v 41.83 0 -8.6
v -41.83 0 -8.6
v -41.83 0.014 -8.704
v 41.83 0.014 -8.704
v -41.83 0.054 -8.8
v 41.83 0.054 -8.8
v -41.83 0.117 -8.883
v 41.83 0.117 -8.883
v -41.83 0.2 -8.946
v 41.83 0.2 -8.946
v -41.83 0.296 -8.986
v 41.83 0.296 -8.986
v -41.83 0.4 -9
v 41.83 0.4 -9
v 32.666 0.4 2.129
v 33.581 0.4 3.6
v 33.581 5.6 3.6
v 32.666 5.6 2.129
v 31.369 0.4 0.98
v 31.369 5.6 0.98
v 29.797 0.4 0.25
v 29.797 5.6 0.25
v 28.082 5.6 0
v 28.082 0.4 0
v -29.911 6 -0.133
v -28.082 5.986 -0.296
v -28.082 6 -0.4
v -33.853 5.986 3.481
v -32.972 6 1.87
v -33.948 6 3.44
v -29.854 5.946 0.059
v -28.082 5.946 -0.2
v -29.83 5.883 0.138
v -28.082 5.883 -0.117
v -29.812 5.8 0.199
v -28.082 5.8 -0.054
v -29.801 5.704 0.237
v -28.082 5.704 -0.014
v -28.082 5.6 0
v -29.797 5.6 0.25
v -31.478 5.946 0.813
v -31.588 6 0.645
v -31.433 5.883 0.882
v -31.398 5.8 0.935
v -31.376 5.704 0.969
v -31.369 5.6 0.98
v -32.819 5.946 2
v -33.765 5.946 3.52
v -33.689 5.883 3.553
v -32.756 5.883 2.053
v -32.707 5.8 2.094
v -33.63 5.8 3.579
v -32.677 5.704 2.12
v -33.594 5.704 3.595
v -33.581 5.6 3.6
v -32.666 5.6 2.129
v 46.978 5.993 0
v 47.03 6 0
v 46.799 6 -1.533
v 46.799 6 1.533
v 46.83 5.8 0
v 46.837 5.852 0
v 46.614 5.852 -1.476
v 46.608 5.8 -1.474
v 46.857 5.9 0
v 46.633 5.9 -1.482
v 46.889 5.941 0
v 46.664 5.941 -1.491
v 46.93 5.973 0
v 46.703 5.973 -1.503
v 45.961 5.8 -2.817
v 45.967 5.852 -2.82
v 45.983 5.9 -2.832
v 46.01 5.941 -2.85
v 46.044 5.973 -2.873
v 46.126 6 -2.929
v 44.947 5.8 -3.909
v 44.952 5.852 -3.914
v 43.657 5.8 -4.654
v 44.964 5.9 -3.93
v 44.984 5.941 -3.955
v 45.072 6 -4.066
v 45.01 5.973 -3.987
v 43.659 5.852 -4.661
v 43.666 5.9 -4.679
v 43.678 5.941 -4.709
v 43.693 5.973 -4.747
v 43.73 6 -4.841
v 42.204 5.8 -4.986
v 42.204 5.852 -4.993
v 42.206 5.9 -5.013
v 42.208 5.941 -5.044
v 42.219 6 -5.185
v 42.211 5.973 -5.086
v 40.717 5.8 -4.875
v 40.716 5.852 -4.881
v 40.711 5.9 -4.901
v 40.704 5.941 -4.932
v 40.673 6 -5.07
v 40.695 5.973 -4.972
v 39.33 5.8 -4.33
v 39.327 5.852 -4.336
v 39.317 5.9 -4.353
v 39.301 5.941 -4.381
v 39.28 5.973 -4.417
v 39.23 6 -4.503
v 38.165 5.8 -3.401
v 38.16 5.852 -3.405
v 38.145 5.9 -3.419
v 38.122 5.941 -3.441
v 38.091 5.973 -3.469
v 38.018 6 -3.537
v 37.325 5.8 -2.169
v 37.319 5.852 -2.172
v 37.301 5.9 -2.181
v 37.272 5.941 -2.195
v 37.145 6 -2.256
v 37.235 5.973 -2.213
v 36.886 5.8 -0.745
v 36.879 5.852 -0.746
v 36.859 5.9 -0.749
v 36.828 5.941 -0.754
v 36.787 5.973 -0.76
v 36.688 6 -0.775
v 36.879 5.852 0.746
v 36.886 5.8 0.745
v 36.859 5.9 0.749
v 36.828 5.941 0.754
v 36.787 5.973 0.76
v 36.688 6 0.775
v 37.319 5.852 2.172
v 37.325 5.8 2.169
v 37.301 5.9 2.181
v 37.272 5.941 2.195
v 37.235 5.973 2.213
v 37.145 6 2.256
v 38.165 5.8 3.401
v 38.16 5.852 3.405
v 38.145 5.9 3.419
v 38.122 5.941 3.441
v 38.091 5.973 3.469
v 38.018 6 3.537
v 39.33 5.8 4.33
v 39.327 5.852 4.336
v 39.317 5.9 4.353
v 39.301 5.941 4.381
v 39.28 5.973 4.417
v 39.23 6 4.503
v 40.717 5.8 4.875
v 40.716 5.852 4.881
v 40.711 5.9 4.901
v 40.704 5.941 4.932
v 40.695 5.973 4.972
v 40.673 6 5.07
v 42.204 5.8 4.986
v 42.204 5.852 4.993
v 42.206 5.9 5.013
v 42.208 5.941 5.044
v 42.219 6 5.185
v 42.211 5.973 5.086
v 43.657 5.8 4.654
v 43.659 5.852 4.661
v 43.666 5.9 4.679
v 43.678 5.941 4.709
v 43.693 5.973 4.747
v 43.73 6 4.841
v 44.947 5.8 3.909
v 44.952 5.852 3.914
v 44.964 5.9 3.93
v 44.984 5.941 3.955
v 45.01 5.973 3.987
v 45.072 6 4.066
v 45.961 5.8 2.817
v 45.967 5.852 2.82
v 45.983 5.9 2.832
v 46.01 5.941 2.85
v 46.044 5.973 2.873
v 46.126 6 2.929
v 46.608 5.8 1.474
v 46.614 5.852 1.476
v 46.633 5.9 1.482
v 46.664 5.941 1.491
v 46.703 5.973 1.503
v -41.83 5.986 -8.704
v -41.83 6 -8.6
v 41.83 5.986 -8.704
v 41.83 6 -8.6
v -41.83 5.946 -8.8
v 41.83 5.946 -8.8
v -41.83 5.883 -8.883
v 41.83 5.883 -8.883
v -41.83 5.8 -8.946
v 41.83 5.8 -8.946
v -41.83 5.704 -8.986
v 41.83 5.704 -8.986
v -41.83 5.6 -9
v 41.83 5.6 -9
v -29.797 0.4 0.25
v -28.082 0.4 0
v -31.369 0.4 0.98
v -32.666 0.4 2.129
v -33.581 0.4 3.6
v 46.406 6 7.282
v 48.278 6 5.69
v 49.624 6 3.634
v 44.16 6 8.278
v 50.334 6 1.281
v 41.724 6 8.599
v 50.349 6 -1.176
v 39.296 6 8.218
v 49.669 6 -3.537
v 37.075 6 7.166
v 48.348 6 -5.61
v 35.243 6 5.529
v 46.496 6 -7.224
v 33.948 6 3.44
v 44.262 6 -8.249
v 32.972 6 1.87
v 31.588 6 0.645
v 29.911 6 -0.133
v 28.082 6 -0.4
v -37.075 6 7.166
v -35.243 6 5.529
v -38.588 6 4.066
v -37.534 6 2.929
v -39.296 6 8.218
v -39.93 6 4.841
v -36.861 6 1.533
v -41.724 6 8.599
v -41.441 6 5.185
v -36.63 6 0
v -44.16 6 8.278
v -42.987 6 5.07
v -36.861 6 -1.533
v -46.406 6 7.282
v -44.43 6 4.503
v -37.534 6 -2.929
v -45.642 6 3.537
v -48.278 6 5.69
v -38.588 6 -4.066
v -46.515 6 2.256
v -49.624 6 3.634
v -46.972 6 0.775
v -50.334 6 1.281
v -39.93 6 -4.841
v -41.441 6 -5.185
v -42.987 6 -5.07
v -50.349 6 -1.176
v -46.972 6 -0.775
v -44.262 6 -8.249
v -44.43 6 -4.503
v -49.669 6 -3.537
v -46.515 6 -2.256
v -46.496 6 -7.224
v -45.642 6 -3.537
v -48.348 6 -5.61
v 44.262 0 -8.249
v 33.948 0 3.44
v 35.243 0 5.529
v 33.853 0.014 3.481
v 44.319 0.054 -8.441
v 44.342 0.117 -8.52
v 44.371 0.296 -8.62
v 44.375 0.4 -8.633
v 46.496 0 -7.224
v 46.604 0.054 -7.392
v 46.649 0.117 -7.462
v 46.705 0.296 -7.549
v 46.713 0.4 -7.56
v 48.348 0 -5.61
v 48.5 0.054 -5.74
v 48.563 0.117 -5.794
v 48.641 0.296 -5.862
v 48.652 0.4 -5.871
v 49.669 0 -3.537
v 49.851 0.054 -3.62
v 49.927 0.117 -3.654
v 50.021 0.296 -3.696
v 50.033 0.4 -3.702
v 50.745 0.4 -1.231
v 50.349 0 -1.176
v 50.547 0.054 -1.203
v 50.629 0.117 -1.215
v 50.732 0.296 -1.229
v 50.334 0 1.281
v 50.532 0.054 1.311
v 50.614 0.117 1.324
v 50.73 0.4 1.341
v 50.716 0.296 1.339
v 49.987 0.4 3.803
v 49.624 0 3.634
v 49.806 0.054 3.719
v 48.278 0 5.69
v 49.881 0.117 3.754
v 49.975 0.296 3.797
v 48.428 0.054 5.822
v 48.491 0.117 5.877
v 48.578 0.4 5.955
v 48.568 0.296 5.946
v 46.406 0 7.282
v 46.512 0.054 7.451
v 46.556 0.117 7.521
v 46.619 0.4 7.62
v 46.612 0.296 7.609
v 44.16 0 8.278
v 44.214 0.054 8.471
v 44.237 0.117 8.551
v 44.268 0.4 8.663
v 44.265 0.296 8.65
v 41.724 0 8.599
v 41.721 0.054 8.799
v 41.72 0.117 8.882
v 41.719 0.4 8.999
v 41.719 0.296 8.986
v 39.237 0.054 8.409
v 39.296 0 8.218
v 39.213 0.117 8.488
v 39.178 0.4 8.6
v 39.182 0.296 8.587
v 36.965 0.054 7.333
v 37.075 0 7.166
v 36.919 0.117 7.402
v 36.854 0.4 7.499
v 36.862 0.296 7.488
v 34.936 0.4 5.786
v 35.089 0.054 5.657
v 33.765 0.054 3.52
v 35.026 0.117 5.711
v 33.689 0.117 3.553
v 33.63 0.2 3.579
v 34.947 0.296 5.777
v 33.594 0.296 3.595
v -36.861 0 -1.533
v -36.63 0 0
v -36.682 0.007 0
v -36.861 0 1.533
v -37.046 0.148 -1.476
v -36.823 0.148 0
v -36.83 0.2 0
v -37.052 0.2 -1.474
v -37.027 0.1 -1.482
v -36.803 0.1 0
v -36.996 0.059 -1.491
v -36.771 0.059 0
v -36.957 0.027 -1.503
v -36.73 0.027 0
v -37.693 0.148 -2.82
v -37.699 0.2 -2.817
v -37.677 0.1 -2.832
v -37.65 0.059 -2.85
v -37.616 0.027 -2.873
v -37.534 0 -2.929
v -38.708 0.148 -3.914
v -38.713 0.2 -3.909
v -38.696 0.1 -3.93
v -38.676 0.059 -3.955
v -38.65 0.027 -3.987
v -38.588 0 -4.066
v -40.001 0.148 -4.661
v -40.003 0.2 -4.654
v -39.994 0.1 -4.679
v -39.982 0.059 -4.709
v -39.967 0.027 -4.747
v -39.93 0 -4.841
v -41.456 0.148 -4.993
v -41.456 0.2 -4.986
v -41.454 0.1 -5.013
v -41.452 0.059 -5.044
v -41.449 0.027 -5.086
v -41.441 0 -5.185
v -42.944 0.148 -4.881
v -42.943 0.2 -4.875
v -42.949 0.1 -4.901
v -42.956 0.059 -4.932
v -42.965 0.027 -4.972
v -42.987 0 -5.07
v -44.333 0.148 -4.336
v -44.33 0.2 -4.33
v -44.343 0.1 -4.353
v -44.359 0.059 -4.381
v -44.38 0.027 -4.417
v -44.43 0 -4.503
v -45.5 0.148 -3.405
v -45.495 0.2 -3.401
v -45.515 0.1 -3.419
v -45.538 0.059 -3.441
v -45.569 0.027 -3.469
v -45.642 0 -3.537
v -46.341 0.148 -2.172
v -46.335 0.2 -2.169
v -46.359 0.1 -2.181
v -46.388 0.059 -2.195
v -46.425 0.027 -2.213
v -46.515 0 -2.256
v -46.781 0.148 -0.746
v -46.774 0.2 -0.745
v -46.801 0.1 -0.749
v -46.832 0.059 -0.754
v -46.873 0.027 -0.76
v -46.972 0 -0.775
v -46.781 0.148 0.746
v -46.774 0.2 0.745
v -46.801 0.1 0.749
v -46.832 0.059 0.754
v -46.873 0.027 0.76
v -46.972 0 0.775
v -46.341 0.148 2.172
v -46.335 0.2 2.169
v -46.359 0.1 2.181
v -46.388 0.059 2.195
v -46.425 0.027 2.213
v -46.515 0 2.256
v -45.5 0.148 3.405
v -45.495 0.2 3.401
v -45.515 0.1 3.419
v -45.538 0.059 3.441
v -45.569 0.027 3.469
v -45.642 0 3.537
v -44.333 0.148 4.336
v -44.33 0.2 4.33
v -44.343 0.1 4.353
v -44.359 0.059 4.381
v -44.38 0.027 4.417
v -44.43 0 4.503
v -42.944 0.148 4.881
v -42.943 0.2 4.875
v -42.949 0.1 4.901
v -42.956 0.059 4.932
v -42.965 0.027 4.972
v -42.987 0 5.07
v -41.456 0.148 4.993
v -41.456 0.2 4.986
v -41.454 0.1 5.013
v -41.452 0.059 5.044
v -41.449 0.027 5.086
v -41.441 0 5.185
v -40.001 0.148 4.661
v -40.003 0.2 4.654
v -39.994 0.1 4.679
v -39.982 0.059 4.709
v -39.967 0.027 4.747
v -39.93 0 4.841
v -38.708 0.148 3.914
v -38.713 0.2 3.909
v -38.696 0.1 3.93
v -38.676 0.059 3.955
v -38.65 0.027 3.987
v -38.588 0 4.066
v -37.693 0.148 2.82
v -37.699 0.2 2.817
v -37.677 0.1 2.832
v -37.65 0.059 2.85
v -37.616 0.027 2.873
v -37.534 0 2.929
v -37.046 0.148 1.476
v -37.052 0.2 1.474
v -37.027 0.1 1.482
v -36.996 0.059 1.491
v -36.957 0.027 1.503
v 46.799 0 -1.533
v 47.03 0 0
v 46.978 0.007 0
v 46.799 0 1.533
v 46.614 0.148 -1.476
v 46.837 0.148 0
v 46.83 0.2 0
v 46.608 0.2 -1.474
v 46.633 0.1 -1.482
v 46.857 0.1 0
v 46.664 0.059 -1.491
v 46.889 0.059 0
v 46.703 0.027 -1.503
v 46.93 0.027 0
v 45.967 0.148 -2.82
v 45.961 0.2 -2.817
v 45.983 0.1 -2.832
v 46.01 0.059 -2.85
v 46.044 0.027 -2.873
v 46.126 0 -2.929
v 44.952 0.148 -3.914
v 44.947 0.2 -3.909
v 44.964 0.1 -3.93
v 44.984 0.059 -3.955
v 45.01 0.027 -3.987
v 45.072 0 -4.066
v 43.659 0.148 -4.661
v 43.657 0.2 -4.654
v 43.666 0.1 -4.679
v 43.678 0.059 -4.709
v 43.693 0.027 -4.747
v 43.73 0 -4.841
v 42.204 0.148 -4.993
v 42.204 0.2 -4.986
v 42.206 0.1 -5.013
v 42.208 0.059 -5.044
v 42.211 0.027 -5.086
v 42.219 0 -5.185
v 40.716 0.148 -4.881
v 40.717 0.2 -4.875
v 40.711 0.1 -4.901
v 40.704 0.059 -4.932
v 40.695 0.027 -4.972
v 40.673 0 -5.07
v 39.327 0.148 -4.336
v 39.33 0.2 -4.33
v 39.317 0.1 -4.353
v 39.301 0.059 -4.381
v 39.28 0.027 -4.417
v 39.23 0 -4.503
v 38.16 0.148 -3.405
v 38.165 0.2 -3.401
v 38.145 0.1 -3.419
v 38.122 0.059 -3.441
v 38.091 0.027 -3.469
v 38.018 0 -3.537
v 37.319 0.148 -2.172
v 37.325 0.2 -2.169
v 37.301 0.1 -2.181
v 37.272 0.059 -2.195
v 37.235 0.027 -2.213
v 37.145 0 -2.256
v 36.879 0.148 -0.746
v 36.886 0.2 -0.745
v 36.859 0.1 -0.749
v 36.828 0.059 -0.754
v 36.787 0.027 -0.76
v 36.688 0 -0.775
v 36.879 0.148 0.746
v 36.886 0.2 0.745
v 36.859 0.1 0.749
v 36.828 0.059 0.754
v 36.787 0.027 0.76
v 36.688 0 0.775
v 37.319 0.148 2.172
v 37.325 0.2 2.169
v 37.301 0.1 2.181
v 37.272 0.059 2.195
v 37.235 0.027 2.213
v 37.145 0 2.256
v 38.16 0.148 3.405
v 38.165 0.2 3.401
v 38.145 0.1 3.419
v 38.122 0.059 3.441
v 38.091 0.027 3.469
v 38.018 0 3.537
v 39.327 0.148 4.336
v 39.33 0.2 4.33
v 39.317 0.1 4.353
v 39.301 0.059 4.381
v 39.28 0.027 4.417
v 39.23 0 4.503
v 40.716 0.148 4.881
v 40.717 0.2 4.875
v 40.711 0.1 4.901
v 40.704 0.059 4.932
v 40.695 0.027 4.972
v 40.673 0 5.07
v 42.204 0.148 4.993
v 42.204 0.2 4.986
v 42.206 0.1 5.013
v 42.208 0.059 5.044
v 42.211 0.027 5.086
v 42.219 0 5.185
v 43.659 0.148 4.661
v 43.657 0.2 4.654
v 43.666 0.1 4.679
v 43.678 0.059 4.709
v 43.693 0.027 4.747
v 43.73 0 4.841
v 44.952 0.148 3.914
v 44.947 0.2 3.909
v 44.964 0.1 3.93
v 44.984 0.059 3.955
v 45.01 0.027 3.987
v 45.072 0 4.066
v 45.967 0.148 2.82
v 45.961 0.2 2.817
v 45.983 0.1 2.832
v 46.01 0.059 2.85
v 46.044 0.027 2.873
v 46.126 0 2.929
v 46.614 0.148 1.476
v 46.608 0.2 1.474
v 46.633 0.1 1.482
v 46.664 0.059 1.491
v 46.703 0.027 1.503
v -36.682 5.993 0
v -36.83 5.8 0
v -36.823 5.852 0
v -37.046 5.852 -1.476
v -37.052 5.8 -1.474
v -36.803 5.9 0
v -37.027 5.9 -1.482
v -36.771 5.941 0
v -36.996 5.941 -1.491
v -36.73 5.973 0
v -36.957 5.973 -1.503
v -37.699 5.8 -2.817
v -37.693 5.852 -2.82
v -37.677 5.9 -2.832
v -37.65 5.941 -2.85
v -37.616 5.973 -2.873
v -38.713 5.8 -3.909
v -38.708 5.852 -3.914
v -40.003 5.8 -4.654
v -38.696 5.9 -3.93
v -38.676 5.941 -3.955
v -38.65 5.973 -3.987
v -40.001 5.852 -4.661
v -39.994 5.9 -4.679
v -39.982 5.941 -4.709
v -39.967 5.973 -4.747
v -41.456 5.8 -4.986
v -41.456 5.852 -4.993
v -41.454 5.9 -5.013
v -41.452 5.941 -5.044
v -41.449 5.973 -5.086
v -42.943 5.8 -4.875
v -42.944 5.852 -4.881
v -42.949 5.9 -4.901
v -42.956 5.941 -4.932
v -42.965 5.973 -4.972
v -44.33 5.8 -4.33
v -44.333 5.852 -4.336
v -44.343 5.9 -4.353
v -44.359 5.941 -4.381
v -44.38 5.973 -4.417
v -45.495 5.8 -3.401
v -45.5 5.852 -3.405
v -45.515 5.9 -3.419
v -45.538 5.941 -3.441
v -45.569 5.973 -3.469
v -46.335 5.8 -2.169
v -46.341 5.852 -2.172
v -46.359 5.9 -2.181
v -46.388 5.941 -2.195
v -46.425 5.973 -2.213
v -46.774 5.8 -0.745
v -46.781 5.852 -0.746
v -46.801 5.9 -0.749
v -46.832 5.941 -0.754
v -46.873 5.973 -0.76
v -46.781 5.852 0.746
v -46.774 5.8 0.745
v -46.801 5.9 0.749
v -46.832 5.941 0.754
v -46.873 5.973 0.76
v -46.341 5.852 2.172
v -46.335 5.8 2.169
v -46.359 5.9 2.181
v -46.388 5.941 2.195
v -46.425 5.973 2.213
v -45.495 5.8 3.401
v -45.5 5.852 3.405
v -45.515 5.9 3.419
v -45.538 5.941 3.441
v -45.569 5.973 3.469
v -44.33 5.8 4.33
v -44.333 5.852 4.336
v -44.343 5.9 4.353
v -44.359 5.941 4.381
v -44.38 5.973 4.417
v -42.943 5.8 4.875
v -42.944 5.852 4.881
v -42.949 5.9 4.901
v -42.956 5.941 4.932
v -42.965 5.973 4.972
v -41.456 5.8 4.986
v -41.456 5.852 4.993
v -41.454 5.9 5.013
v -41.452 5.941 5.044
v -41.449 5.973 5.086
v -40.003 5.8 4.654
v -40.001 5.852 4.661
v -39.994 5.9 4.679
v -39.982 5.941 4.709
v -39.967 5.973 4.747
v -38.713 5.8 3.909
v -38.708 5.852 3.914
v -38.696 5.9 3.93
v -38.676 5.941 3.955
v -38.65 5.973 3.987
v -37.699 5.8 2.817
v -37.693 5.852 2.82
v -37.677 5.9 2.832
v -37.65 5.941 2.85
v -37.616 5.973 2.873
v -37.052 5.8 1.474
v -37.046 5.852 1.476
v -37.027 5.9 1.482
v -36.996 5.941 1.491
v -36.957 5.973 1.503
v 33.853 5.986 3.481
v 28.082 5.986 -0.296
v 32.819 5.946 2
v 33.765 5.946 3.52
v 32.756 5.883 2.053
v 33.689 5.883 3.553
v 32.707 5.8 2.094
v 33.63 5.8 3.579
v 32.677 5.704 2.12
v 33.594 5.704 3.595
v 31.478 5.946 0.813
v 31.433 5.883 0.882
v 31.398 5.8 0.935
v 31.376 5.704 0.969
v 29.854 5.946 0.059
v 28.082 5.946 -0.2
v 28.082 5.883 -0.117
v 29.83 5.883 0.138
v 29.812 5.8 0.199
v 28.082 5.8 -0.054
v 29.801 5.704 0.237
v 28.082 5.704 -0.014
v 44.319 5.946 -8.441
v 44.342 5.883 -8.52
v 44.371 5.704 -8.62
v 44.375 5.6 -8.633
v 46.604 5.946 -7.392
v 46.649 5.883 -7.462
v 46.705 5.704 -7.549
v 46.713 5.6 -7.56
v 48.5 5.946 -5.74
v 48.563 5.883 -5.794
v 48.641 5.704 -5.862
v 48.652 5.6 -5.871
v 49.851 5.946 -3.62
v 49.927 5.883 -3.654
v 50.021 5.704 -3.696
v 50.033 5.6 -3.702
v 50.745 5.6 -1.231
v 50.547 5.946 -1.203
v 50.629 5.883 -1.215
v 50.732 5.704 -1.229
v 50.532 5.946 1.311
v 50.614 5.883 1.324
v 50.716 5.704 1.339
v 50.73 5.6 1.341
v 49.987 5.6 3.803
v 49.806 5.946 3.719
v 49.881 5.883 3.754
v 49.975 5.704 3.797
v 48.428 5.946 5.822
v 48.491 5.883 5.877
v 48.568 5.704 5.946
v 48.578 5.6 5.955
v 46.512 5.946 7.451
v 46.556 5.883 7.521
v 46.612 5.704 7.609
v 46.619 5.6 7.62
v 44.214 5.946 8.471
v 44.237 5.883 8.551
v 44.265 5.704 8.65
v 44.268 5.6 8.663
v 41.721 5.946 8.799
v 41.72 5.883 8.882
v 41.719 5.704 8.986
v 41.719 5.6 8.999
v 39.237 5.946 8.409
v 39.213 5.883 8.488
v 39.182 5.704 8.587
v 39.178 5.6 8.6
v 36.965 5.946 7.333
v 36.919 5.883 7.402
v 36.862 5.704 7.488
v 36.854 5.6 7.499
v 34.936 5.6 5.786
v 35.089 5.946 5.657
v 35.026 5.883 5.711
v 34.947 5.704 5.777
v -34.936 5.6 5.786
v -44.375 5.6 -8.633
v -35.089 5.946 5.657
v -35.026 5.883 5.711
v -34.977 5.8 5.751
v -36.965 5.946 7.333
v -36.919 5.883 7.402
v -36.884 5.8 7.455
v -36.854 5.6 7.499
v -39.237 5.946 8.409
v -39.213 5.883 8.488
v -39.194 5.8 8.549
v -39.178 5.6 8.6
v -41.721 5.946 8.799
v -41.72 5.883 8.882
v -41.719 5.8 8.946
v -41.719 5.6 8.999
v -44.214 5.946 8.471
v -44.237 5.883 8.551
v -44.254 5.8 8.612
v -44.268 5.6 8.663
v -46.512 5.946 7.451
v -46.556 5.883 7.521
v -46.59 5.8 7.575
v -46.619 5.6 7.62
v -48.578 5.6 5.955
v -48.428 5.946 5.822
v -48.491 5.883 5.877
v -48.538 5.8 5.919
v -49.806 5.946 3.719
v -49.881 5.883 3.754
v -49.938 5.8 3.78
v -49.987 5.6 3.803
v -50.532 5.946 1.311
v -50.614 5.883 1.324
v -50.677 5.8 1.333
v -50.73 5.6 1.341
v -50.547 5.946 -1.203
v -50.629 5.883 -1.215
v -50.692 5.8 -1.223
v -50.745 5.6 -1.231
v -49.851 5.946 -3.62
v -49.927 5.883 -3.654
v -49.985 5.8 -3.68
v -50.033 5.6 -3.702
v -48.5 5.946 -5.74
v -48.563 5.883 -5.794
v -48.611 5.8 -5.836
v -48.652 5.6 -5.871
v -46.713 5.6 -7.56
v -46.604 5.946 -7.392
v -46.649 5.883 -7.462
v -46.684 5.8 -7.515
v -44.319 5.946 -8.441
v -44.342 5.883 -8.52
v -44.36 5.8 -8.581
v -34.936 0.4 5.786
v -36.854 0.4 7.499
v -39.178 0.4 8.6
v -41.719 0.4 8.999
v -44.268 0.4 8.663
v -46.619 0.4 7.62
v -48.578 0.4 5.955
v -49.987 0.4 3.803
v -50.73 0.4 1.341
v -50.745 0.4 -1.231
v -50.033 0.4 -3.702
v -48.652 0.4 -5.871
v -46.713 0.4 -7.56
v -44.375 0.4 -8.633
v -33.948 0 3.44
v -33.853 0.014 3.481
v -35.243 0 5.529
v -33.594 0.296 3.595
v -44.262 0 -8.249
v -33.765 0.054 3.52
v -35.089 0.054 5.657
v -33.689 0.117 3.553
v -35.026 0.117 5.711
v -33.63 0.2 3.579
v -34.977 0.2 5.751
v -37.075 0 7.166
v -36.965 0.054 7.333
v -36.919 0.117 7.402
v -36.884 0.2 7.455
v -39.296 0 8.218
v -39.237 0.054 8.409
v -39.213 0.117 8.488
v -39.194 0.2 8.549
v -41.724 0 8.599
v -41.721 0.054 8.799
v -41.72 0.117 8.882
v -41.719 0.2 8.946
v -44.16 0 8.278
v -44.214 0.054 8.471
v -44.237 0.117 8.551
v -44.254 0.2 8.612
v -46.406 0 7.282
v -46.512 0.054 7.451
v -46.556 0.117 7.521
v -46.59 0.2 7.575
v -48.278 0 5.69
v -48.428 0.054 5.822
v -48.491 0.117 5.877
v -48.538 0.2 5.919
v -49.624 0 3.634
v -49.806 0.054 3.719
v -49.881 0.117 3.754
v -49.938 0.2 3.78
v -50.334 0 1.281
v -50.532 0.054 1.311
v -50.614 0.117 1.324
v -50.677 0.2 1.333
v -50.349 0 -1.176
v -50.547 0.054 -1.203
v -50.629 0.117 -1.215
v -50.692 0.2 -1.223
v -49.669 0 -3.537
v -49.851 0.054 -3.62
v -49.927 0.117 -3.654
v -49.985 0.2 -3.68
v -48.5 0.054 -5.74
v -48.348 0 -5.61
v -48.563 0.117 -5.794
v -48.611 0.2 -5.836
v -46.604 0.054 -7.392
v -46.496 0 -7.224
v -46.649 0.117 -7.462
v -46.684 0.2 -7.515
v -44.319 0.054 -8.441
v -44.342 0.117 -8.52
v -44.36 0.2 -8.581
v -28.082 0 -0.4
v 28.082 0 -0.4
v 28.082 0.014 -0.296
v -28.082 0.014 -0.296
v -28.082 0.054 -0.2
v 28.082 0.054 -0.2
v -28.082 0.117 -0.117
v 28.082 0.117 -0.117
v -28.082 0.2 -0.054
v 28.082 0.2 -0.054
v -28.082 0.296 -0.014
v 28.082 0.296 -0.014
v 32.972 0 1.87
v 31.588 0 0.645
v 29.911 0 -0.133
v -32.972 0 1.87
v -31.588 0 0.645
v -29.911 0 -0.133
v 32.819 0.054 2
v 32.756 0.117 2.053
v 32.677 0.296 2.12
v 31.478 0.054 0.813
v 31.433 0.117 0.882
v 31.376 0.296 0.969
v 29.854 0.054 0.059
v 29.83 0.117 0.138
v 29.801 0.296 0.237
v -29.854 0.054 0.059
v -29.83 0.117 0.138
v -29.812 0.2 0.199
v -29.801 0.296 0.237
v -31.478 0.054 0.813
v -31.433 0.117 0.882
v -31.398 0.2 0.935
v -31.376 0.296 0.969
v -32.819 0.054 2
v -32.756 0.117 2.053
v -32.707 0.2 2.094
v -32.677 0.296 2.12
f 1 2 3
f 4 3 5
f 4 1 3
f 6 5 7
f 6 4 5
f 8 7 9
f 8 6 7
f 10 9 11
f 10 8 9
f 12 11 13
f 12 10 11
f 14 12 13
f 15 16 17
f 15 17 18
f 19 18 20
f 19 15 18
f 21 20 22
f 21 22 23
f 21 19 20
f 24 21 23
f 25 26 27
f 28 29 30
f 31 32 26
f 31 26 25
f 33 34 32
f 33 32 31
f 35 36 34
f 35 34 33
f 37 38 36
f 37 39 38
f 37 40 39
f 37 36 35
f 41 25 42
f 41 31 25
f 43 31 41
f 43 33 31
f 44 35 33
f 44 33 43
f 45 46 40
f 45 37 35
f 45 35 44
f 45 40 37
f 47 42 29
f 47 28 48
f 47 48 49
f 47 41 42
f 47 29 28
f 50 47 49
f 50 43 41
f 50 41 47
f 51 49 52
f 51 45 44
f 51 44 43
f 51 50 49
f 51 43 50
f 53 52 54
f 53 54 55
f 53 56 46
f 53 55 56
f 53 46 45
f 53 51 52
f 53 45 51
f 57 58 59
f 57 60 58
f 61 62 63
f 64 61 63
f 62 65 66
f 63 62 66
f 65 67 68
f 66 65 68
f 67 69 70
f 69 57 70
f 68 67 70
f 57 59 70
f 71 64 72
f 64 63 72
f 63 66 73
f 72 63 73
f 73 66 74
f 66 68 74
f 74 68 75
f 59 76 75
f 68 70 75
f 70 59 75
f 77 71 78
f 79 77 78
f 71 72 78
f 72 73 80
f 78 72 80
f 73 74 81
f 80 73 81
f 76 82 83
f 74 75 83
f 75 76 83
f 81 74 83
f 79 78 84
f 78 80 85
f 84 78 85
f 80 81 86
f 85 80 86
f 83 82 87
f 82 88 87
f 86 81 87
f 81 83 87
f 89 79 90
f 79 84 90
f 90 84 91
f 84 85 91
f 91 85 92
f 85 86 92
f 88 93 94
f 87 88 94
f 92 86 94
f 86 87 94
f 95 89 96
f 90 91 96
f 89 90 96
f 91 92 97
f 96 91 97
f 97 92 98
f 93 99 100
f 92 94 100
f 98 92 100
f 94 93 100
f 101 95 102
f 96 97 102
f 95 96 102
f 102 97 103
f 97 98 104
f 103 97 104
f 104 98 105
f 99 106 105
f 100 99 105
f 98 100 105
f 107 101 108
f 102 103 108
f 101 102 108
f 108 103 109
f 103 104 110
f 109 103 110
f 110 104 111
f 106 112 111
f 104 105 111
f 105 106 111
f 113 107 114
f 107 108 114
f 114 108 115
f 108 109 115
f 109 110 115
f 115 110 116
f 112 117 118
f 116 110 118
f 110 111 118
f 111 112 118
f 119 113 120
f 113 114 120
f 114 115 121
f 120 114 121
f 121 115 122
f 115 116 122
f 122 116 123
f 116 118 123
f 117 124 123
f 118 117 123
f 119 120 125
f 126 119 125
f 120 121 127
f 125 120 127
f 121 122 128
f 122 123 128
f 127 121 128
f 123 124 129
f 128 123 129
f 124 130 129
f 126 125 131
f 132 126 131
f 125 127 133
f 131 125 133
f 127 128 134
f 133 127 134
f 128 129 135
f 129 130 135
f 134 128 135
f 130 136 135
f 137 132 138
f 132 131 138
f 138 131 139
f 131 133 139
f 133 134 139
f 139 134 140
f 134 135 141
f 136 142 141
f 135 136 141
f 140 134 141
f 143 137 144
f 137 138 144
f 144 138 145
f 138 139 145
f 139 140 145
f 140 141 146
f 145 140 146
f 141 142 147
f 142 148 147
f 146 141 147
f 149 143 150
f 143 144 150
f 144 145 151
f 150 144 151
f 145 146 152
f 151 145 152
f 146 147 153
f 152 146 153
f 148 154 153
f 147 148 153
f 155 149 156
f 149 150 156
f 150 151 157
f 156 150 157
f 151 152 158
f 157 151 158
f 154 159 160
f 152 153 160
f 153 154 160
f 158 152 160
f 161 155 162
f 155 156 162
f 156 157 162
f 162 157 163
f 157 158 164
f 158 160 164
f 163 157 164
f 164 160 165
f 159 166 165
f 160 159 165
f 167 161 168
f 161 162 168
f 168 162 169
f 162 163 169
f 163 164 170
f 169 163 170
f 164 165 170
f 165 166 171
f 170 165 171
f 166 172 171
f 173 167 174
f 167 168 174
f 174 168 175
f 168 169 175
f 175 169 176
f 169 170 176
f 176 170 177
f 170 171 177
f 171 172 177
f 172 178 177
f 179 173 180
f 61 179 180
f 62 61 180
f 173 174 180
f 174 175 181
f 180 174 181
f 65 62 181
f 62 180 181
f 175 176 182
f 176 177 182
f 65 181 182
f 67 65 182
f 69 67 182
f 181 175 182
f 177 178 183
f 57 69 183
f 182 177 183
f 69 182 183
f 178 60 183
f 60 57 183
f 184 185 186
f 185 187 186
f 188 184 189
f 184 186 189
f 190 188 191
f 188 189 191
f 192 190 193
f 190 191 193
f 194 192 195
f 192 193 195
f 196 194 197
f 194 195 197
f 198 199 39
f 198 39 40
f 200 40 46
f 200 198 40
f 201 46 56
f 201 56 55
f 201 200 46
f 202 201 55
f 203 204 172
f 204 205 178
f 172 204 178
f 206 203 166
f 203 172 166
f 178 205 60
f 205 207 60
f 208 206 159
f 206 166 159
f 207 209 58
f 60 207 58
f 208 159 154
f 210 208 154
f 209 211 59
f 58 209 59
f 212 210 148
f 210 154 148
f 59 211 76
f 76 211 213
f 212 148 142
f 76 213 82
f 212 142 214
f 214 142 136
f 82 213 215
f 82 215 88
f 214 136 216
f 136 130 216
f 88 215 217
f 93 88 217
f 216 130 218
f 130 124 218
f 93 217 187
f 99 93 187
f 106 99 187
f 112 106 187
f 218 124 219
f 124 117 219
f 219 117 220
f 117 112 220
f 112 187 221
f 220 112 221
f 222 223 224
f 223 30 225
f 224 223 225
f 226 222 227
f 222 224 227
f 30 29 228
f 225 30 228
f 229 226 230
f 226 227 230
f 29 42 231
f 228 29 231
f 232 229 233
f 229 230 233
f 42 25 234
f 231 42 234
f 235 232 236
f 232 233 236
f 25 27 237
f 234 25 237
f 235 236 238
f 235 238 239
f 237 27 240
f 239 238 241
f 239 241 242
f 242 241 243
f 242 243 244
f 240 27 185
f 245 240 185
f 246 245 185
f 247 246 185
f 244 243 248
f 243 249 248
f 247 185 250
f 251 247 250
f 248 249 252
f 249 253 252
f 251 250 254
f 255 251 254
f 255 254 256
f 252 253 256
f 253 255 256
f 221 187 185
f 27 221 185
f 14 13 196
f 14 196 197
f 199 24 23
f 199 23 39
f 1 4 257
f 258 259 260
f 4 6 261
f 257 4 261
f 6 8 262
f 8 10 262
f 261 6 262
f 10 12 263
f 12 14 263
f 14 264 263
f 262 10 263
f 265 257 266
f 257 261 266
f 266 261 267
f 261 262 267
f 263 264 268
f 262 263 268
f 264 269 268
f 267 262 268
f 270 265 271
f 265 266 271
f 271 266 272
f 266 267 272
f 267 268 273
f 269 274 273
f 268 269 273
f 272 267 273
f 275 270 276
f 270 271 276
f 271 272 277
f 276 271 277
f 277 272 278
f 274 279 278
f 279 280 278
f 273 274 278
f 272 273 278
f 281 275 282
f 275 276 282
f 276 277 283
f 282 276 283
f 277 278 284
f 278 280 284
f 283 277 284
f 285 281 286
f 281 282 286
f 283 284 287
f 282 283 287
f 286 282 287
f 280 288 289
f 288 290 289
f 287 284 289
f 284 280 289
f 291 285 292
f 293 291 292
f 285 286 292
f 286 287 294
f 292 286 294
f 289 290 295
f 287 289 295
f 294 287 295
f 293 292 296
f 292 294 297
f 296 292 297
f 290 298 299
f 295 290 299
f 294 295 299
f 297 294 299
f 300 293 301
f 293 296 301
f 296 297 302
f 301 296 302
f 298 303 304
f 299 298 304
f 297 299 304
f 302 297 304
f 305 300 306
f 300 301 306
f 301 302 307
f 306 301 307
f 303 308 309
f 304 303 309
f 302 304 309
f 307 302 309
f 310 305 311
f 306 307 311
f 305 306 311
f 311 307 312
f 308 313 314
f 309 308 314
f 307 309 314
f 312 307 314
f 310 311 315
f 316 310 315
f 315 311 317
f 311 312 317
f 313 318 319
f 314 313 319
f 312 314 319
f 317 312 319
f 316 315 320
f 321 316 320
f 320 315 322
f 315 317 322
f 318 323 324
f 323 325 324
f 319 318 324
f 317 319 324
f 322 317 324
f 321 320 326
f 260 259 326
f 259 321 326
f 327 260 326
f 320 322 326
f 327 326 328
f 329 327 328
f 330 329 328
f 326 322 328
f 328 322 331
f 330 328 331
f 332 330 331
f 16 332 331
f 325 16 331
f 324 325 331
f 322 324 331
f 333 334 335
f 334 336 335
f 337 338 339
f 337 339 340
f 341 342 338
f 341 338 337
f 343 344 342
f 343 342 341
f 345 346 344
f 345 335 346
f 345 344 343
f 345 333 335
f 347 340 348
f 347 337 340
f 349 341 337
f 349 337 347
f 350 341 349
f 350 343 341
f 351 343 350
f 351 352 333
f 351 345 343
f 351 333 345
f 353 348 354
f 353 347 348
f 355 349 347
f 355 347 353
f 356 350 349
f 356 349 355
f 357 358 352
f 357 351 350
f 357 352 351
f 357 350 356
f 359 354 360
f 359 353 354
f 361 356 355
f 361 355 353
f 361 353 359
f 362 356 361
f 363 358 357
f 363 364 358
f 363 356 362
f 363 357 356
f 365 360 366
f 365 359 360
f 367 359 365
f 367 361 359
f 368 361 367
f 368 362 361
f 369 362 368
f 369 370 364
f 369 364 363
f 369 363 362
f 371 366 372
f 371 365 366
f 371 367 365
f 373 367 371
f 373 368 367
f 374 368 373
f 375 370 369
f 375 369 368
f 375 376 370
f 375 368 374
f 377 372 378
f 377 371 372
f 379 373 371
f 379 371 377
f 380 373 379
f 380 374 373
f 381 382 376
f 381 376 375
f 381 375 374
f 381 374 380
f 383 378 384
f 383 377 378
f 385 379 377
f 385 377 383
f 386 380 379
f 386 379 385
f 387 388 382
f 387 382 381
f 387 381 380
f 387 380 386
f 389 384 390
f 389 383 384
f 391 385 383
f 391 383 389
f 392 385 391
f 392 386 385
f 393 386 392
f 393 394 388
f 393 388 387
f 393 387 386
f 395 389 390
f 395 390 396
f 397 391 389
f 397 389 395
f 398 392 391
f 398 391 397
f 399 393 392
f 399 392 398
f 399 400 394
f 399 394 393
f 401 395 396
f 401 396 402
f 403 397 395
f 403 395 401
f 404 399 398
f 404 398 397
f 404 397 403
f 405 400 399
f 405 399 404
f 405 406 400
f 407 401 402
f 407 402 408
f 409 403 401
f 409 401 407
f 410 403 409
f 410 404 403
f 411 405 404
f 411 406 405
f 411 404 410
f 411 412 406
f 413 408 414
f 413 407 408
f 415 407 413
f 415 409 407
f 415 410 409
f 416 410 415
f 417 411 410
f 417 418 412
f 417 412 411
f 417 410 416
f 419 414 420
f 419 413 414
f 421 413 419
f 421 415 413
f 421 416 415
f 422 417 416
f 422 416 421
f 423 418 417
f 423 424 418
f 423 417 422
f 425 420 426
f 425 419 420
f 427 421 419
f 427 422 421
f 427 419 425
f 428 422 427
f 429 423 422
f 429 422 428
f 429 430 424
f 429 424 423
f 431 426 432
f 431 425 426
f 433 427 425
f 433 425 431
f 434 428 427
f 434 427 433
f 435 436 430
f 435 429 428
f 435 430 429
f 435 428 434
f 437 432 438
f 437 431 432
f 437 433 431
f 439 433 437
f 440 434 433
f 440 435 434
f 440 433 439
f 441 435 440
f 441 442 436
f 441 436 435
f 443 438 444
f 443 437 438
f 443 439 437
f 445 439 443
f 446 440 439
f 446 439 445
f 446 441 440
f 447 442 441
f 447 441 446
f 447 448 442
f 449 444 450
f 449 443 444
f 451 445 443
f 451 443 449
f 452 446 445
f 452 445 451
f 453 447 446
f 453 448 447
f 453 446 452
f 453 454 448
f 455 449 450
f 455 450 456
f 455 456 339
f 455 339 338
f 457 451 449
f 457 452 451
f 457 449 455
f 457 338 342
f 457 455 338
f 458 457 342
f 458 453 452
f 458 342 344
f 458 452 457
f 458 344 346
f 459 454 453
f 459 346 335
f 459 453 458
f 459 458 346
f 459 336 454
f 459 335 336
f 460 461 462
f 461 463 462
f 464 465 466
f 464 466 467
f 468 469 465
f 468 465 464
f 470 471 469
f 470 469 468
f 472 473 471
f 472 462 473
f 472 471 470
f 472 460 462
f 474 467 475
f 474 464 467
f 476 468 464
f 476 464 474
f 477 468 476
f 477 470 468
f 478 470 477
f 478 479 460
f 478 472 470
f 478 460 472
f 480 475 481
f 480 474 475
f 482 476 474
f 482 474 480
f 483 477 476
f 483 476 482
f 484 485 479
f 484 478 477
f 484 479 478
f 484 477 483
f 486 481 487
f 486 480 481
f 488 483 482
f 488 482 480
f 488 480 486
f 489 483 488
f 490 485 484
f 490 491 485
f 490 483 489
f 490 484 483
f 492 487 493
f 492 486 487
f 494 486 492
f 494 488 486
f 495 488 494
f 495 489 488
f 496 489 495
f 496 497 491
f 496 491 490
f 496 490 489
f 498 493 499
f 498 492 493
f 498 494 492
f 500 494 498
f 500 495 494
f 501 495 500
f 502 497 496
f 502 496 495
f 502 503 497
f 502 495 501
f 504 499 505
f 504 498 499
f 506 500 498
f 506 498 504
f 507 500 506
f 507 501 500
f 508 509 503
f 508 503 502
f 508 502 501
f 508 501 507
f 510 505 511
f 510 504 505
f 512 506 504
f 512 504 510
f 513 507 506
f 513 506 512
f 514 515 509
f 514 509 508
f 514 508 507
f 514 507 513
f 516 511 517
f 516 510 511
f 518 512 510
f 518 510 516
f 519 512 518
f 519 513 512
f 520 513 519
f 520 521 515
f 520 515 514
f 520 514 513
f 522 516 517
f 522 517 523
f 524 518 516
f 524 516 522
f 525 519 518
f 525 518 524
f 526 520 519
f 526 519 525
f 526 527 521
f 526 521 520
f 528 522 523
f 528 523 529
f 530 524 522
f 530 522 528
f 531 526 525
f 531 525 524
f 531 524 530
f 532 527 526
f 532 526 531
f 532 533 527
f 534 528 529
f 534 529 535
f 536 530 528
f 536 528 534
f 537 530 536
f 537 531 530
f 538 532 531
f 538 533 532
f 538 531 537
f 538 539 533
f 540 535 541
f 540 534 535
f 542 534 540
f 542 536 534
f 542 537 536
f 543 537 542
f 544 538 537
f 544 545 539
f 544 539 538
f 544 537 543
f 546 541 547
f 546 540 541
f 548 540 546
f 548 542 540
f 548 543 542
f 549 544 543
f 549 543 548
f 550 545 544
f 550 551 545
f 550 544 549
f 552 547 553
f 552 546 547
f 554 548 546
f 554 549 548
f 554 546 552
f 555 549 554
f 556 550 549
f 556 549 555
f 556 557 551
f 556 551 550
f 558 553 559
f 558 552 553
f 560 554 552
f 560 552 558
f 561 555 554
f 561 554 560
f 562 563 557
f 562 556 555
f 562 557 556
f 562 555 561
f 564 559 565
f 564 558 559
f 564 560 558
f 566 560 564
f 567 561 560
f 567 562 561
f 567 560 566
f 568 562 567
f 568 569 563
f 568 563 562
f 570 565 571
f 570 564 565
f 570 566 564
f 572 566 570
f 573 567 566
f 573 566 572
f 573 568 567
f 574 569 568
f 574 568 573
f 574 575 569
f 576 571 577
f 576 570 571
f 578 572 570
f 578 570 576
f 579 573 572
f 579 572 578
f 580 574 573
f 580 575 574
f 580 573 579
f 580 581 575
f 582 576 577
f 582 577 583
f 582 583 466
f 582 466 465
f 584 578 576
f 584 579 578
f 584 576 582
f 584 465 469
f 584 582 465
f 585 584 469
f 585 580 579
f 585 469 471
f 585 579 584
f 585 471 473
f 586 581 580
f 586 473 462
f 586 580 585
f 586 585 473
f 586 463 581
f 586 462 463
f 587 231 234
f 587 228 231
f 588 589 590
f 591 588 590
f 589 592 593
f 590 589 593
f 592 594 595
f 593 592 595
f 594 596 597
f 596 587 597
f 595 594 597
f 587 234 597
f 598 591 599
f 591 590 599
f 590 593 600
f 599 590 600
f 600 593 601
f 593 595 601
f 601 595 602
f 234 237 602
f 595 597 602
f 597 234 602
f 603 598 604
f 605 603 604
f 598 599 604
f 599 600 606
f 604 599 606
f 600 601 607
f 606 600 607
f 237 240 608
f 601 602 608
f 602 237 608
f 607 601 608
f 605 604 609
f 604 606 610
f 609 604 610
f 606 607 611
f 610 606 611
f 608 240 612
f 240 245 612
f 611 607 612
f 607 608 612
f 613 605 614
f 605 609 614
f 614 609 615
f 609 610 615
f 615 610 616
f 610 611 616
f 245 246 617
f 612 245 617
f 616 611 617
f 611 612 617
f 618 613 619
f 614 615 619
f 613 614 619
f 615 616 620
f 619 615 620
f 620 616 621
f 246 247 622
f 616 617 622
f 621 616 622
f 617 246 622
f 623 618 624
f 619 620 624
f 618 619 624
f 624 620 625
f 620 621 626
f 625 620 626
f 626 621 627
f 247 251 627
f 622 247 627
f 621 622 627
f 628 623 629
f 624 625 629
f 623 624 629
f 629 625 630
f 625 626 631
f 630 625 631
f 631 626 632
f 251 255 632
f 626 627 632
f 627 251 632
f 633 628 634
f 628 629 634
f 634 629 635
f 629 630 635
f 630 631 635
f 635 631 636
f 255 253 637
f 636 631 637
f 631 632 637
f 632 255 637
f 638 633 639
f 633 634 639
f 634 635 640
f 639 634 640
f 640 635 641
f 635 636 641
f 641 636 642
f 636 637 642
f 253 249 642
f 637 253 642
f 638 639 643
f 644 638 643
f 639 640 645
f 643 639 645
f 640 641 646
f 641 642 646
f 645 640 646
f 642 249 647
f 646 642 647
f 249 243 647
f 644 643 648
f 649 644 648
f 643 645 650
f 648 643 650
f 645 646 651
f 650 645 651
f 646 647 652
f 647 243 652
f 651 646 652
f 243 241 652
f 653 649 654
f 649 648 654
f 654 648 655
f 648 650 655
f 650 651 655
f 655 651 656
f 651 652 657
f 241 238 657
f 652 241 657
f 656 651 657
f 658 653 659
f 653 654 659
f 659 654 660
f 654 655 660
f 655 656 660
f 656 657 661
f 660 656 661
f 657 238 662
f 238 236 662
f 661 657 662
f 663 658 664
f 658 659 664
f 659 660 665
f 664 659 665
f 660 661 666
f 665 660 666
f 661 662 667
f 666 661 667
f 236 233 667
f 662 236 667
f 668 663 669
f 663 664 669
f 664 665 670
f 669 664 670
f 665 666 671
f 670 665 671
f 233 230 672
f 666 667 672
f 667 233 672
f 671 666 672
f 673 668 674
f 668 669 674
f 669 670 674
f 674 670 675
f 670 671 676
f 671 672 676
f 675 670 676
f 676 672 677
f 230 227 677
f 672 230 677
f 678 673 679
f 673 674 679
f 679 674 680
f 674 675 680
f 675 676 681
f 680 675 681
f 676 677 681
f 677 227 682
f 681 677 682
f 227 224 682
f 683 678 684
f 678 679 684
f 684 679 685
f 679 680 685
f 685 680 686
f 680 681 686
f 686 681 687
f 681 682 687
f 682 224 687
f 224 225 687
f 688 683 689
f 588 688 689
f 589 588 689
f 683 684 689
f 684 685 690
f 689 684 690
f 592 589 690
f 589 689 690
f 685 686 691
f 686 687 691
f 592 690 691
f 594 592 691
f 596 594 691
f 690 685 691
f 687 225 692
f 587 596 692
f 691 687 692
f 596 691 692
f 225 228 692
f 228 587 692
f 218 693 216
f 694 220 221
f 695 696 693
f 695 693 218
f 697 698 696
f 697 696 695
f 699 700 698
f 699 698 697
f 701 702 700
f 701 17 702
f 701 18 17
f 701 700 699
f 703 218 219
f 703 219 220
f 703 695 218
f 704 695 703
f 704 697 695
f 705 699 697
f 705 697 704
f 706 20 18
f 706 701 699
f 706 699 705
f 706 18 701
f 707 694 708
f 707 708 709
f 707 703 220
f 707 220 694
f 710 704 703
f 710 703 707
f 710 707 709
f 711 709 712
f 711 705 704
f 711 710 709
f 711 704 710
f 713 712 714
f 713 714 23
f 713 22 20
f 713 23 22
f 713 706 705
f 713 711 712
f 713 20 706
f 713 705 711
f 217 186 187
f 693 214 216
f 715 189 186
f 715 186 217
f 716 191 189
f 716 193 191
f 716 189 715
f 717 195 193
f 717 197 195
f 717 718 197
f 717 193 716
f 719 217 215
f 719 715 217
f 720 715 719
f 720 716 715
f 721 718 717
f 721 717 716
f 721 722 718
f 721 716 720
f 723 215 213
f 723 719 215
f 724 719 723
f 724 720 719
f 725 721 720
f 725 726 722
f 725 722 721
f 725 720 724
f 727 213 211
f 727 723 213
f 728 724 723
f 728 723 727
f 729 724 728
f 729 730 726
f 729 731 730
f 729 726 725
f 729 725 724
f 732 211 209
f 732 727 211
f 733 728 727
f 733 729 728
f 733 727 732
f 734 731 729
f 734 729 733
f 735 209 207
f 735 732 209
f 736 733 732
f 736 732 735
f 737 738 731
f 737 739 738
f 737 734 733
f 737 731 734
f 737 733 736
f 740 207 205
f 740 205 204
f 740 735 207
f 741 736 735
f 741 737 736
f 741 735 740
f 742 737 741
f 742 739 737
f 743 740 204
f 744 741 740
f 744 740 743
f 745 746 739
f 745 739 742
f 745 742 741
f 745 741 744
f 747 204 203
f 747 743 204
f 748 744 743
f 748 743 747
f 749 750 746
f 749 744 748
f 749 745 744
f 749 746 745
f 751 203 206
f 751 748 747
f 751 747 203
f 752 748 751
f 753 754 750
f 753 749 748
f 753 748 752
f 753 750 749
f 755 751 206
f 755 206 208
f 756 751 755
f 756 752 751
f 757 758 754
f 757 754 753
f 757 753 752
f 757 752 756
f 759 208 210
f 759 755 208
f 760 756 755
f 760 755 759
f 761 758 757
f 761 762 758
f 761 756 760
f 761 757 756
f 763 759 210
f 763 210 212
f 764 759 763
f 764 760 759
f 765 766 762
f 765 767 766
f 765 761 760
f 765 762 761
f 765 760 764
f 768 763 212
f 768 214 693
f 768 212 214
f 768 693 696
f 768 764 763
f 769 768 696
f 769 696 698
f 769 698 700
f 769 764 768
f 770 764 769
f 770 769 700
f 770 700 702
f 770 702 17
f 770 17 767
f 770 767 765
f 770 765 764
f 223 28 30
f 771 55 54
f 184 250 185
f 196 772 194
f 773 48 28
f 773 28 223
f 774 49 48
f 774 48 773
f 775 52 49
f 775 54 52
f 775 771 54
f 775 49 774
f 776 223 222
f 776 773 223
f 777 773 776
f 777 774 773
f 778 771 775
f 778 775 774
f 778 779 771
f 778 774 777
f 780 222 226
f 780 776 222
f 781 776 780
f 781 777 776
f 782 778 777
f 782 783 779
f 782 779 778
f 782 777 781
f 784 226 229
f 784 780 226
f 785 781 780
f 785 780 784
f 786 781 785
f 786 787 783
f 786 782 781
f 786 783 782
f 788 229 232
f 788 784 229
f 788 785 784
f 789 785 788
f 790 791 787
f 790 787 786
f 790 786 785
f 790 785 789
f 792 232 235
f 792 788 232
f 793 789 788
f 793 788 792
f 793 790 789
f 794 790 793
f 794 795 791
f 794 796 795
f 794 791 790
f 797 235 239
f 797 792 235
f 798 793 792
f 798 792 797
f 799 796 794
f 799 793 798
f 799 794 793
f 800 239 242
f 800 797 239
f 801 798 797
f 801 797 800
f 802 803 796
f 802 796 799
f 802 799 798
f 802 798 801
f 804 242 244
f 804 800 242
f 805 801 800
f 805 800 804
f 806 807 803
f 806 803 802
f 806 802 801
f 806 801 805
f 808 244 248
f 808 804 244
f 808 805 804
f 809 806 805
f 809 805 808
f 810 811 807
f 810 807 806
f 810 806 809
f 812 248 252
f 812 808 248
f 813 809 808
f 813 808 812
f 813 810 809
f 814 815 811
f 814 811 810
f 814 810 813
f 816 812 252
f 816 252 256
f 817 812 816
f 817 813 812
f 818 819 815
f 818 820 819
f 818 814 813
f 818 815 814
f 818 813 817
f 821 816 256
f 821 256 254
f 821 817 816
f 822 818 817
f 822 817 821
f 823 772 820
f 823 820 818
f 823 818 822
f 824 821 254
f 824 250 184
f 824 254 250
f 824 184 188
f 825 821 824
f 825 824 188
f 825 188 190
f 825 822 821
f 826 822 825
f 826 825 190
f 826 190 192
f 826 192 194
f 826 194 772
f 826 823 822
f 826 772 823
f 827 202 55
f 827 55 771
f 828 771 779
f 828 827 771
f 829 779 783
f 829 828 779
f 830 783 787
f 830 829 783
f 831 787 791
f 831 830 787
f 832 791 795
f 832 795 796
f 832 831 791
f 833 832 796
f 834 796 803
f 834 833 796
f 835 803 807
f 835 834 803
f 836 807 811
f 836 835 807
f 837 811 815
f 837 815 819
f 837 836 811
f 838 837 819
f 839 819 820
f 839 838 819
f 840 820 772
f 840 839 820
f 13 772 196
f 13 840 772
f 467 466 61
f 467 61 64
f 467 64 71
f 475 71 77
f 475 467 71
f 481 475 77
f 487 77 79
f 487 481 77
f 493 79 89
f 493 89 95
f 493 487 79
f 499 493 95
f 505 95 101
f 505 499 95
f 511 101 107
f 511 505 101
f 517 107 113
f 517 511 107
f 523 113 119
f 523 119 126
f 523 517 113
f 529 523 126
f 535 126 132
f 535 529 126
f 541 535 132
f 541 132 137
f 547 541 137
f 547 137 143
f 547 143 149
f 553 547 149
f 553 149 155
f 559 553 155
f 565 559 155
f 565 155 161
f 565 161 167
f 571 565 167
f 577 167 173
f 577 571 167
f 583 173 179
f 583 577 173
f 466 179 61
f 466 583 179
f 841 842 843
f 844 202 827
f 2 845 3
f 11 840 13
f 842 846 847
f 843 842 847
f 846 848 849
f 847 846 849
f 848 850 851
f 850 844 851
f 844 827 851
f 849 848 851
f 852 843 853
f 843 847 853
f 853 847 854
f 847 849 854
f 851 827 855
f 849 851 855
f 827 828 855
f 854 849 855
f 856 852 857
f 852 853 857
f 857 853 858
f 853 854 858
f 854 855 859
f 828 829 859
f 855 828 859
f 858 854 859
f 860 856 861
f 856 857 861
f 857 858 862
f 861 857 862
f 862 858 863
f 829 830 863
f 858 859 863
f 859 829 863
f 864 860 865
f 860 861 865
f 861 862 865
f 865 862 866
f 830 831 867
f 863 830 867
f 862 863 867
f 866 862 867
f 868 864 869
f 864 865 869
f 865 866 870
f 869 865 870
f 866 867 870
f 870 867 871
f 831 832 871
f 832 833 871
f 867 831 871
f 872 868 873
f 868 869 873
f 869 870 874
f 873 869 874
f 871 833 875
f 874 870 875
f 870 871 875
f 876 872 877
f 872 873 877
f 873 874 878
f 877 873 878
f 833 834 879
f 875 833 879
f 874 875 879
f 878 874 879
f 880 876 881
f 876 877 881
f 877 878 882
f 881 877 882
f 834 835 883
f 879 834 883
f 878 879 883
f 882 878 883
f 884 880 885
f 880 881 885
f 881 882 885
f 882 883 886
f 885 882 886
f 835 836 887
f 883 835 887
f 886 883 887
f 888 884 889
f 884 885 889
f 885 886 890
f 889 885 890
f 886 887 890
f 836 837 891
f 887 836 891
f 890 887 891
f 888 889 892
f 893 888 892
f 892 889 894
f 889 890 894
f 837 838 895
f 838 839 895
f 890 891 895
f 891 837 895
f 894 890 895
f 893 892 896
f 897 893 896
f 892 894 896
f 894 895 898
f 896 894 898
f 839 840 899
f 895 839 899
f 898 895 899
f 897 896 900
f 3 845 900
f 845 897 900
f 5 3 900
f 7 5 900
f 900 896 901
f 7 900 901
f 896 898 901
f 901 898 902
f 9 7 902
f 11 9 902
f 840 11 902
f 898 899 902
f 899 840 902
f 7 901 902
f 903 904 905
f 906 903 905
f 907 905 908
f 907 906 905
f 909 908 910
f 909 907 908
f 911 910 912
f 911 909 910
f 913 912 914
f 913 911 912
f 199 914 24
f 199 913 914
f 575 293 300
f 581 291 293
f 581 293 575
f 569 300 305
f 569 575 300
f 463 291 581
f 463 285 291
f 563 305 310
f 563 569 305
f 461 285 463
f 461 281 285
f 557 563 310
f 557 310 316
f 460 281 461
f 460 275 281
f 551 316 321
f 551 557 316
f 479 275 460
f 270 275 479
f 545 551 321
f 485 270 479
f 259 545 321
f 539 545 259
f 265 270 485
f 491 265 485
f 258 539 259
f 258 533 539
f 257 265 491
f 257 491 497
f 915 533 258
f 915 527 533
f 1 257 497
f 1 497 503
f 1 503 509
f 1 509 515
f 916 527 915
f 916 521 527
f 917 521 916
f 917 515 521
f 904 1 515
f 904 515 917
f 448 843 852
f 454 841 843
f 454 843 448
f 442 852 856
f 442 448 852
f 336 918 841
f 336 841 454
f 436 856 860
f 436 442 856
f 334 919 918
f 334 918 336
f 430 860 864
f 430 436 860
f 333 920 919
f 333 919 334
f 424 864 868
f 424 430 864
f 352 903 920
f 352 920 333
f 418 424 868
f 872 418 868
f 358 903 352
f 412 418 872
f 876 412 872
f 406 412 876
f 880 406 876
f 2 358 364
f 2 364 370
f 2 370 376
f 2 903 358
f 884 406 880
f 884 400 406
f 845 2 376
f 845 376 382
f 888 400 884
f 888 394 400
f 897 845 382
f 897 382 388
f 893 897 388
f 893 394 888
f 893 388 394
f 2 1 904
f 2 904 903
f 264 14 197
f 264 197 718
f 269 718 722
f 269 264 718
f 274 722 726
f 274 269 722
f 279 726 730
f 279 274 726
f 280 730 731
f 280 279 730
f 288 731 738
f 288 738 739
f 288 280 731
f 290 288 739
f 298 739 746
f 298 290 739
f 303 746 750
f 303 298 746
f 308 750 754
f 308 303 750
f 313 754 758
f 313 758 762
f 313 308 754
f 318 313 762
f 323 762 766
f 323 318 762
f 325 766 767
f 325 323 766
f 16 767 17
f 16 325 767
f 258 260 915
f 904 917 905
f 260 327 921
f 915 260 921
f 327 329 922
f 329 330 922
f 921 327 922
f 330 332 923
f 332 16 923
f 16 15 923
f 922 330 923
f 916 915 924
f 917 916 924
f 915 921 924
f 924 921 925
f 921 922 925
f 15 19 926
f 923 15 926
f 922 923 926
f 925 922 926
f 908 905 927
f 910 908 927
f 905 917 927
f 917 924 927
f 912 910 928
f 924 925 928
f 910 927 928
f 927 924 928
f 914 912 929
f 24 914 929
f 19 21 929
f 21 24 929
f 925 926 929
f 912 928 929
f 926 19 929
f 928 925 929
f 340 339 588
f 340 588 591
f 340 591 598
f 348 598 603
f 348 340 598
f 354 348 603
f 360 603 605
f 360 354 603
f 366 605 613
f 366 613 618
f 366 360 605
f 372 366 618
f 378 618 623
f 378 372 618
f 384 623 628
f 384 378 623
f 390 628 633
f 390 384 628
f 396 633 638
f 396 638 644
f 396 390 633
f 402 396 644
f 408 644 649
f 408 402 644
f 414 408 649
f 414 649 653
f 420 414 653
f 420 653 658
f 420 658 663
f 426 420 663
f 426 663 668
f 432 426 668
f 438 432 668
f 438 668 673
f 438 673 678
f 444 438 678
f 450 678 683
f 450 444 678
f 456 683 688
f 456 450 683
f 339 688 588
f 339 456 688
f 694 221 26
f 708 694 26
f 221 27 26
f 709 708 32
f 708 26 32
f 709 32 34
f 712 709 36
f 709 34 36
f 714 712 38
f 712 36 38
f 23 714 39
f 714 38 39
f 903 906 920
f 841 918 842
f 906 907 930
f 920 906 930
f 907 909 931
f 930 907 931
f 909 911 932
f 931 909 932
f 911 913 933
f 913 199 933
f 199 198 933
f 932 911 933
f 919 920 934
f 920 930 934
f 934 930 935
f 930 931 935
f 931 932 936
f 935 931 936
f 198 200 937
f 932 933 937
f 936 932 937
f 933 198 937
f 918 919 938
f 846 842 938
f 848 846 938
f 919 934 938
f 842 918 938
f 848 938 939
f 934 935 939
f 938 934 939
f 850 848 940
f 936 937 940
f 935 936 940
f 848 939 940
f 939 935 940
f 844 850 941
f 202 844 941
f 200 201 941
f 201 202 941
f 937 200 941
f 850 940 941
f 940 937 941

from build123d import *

# Parameters (mm, degrees)
SKETCH_1_R      = 5
EXTRUDE_1_DEPTH = 6
FILLET_1_R      = 0.2
FILLET_2_R      = 0.4


with BuildPart() as part:
    # 草图1 → 凸台-拉伸1 (new body)
    with BuildSketch(Plane(origin=(0, 0, 0), x_dir=(1, 0, 0), z_dir=(0, 1, 0))):
        with BuildLine():
            Line((-41.83, 9), (41.83, 9))
            ThreePointArc((41.83, 9), (49.359940239, -4.929503018), (33.581363749, -3.6))
            ThreePointArc((33.581363749, -3.6), (31.36860826, -0.980039841), (28.082272915, 0))
            Line((28.082272915, 0), (-28.082272915, 0))
            ThreePointArc((-28.082272915, 0), (-31.36860826, -0.980039841), (-33.581363749, -3.6))
            ThreePointArc((-33.581363749, -3.6), (-49.359940239, -4.929503018), (-41.83, 9))
        make_face()
        with Locations((-41.83, 0)):
            Circle(SKETCH_1_R, mode=Mode.SUBTRACT)
        with Locations((41.83, 0)):
            Circle(SKETCH_1_R, mode=Mode.SUBTRACT)
    extrude(amount=EXTRUDE_1_DEPTH)

    # 圆角1
    fillet_1_edges = [part.edges().sort_by_distance(p)[0] for p in [
        (-46.83, 0, 0),
        (-46.83, 6, 0),
        (36.83, 0, 0),
        (36.83, 6, 0),
    ]]
    fillet(fillet_1_edges, radius=FILLET_1_R)

    # 圆角2
    fillet_2_edges = [part.edges().sort_by_distance(p)[0] for p in [
        (0, 6, -9),
        (-49.359940239, 6, 4.929503018),
        (-31.36860826, 6, 0.980039841),
        (0, 6, 0),
        (31.36860826, 6, 0.980039841),
        (0, 0, 0),
        (-31.36860826, 0, 0.980039841),
        (-49.359940239, 0, 4.929503018),
        (0, 0, -9),
        (49.359940239, 0, 4.929503018),
        (31.36860826, 0, 0.980039841),
        (49.359940239, 6, 4.929503018),
    ]]
    fillet(fillet_2_edges, radius=FILLET_2_R)


solid = part.part
